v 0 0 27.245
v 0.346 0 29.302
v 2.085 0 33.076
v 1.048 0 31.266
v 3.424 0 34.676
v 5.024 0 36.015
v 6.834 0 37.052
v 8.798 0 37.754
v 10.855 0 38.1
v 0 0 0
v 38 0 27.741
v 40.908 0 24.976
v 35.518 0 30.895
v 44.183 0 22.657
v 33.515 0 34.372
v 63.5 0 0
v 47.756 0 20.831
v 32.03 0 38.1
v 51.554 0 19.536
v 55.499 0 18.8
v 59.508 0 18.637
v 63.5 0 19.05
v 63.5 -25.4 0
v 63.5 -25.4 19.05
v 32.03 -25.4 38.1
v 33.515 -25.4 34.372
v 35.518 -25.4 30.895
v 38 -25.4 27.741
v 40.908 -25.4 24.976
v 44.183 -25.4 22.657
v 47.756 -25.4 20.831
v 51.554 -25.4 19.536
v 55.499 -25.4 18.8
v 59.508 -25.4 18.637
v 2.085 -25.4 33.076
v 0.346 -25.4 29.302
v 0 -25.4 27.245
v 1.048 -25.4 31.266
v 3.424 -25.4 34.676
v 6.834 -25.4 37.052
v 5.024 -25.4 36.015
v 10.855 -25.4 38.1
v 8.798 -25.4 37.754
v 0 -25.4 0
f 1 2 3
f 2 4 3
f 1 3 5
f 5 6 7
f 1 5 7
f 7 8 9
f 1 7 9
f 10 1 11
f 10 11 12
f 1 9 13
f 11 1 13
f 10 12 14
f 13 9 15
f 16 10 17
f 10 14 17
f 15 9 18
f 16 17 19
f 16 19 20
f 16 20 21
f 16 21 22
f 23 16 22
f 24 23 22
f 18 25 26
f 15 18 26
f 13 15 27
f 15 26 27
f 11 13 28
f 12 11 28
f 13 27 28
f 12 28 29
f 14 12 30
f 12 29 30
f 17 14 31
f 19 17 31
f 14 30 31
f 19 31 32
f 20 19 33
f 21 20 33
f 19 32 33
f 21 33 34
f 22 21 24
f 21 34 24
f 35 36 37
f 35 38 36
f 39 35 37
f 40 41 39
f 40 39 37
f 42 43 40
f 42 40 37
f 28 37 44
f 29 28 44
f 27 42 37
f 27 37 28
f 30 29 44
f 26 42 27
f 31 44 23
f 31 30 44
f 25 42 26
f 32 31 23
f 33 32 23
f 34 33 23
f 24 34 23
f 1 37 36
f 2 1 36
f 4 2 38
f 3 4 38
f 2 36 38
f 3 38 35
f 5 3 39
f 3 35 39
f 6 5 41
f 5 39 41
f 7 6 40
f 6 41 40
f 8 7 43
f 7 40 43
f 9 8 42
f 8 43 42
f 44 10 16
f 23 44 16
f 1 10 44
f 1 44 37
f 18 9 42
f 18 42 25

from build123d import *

# Parameters (mm, degrees)
F0_W     = 63.5
F0_H     = 38.1
F1_DEPTH = 25.4
F3_DEPTH = 25.4
F5_DEPTH = 25.4


with BuildPart() as f1:
    # F0 (on Front) → F1 (new body)
    with BuildSketch(Plane.XZ):
        with Locations((31.75, 19.05)):
            Rectangle(F0_W, F0_H)
    extrude(amount=F1_DEPTH)

    # F2 (on face) → F3 (cut)
    with BuildSketch(Plane.XZ.offset(25.4)):
        with BuildLine():
            ThreePointArc((0, 27.2450184846), (3.4240390206, 34.6759609794), (10.8549815154, 38.1))
            Line((10.8549815154, 38.1), (0, 38.1))
            Line((0, 38.1), (0, 27.2450184846))
        make_face()
    extrude(amount=-F3_DEPTH, mode=Mode.SUBTRACT)

    # F4 (on face) → F5 (cut)
    with BuildSketch(Plane.XZ.offset(25.4)):
        with BuildLine():
            Line((63.5, 19.05), (63.5, 38.1))
            Line((63.5, 38.1), (32.0302583277, 38.1))
            ThreePointArc((32.0302583277, 38.1), (44.1825704722, 22.6567744591), (63.5, 19.05))
        make_face()
    extrude(amount=-F5_DEPTH, mode=Mode.SUBTRACT)


solid = f1.part
